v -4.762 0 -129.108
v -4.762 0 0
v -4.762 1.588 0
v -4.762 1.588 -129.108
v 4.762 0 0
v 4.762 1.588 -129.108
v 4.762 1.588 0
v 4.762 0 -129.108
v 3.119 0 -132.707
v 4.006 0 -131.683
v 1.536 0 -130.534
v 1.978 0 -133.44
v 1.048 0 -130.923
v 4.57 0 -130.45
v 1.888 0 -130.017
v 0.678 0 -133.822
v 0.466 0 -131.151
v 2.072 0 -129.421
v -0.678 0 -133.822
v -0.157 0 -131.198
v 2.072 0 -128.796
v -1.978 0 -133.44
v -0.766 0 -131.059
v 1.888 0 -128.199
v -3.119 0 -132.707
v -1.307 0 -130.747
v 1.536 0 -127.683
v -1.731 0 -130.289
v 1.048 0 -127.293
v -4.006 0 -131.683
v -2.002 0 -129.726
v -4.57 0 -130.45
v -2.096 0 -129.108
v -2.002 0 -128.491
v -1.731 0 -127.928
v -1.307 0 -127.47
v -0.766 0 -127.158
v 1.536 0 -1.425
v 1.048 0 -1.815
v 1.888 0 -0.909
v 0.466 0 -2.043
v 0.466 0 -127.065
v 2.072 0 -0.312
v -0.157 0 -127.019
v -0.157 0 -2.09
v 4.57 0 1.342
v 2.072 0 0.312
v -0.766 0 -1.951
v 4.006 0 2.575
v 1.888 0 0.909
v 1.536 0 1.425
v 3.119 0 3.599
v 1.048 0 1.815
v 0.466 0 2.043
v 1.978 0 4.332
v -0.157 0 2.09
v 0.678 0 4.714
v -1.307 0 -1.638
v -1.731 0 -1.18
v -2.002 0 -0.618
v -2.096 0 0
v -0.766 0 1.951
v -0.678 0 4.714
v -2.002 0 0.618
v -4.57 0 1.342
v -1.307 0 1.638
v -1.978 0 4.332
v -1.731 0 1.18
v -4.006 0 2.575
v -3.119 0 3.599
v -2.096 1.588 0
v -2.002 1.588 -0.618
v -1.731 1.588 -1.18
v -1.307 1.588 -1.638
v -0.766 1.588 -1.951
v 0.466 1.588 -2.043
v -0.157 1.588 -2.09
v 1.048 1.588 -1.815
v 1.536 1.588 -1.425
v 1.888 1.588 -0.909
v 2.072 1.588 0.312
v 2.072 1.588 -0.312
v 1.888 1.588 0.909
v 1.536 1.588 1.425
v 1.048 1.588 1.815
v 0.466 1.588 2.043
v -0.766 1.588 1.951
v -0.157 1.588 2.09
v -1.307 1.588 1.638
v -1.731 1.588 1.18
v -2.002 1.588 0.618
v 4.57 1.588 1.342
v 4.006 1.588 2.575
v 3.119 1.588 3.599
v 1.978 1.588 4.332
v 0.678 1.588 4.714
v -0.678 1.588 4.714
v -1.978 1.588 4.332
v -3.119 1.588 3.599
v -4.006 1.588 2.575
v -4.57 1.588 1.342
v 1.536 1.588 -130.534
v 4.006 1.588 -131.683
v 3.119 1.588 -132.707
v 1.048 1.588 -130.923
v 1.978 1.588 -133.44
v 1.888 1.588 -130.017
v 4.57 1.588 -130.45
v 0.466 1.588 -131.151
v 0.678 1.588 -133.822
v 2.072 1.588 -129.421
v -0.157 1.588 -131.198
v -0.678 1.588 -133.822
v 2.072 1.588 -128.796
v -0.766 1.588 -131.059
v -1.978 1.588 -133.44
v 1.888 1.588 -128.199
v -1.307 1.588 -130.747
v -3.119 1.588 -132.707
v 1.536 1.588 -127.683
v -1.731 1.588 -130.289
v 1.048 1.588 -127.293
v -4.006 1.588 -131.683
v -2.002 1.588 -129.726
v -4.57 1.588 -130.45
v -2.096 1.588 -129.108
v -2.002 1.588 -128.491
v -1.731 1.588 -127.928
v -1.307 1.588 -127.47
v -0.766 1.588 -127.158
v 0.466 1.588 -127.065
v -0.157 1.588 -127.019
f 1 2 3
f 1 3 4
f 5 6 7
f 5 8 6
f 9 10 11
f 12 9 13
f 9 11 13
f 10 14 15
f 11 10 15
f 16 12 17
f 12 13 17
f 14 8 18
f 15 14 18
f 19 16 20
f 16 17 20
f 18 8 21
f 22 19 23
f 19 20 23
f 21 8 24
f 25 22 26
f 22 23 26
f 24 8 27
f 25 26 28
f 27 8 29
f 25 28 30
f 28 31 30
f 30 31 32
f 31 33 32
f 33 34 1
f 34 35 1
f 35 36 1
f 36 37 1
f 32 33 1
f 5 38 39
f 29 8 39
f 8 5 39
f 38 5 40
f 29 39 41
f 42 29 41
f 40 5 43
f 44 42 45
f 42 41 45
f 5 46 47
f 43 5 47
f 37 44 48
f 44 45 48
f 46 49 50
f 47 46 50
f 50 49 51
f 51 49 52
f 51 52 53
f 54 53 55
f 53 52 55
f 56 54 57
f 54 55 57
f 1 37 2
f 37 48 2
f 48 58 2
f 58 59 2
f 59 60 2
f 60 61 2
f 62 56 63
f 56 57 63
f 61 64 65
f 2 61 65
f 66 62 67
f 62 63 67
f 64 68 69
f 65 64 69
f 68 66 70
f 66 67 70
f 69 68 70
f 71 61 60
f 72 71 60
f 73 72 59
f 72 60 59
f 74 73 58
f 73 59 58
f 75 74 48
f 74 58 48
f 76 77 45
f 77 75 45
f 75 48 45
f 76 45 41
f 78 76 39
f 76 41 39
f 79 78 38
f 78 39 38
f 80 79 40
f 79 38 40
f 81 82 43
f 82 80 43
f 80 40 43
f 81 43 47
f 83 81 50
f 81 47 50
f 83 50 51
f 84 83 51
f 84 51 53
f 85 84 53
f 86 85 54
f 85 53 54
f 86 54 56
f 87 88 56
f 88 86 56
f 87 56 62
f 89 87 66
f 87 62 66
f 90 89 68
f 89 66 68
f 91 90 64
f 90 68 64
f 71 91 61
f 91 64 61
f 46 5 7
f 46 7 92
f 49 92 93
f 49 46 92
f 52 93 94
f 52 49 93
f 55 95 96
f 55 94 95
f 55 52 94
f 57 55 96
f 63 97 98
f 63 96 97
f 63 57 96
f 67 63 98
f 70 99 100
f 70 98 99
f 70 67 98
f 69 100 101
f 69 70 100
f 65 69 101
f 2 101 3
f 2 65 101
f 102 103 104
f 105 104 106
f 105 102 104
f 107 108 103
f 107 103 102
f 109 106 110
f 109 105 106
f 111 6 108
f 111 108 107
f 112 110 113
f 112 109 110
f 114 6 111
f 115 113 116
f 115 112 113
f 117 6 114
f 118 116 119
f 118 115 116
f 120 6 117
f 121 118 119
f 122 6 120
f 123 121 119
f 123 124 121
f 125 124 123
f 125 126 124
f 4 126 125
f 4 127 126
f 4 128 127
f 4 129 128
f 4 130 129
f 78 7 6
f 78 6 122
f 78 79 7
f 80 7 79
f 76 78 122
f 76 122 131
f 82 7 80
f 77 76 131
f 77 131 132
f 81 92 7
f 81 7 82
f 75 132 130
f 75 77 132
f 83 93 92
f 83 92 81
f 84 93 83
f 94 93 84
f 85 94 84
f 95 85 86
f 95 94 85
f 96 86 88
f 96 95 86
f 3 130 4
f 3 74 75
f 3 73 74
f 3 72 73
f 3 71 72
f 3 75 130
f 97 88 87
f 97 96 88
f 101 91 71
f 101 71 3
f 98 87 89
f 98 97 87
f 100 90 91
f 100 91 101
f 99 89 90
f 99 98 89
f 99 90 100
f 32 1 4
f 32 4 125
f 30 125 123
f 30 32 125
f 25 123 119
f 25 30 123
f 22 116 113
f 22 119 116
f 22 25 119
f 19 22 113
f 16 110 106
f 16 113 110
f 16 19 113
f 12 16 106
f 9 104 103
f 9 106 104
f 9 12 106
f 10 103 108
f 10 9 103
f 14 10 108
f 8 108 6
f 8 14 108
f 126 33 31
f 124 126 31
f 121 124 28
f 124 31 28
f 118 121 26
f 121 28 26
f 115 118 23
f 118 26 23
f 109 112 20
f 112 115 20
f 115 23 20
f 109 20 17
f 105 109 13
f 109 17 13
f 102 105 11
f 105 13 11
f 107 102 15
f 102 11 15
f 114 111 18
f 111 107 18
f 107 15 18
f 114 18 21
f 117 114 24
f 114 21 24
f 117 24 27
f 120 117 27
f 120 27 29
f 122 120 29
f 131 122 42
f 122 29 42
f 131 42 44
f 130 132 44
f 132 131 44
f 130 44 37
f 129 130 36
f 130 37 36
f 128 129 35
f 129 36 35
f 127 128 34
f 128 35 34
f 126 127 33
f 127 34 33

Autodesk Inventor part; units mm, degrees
ref_plane "YZ Plane" through (0, 0, 0) normal (1, 0, 0) x (0, 1, 0)
ref_plane "XZ Plane" through (0, 0, 0) normal (0, 1, 0) x (-1, 0, 0)
ref_plane "XY Plane" through (0, 0, 0) normal (0, 0, 1) x (1, 0, 0)
sketch "Sketch1" plane through (0, 0, 0) normal (0, 1, 0) x (-1, 0, 0)
  circle A0 centre (0, 0) radius 2.0955
  circle A1 centre (0, -129.1082) radius 2.0955
  arc A2 (4.7625, 0) -> (-4.7625, 0) centre (0, 0) ccw
  arc A3 (-4.7625, -129.1082) -> (4.7625, -129.1082) centre (0, -129.1082) ccw
  line L0 (4.7625, 0) -> (4.7625, -129.1082)
  line L1 (-4.7625, -129.1082) -> (-4.7625, 0)
  dimension "d0" = 4.191
  dimension "d1" = 4.191
  dimension "d2" = 9.525
  dimension "d3" = 9.525
extrude "Extrusion1" add sketch "Sketch1" along normal blind 1.5875
equation "\"BendRadius\" = Thickness"
equation "\"BendReliefWidth\" = Thickness"
equation "\"BendReliefDepth\" = 0.5 * Thickness"
equation "\"CornerReliefSize\" = 4 * Thickness"
equation "\"MinimumRemnant\" = 2 * Thickness"
equation "\"TransitionRadius\" = BendRadius"
equation "\"JacobiRadiusSize\" = BendRadius"
equation "\"GapSize\" = Thickness"
equation "\"Thickness\" = 3.048"
properties part number "brace-gussest" material "Acetal Resin, Black"
